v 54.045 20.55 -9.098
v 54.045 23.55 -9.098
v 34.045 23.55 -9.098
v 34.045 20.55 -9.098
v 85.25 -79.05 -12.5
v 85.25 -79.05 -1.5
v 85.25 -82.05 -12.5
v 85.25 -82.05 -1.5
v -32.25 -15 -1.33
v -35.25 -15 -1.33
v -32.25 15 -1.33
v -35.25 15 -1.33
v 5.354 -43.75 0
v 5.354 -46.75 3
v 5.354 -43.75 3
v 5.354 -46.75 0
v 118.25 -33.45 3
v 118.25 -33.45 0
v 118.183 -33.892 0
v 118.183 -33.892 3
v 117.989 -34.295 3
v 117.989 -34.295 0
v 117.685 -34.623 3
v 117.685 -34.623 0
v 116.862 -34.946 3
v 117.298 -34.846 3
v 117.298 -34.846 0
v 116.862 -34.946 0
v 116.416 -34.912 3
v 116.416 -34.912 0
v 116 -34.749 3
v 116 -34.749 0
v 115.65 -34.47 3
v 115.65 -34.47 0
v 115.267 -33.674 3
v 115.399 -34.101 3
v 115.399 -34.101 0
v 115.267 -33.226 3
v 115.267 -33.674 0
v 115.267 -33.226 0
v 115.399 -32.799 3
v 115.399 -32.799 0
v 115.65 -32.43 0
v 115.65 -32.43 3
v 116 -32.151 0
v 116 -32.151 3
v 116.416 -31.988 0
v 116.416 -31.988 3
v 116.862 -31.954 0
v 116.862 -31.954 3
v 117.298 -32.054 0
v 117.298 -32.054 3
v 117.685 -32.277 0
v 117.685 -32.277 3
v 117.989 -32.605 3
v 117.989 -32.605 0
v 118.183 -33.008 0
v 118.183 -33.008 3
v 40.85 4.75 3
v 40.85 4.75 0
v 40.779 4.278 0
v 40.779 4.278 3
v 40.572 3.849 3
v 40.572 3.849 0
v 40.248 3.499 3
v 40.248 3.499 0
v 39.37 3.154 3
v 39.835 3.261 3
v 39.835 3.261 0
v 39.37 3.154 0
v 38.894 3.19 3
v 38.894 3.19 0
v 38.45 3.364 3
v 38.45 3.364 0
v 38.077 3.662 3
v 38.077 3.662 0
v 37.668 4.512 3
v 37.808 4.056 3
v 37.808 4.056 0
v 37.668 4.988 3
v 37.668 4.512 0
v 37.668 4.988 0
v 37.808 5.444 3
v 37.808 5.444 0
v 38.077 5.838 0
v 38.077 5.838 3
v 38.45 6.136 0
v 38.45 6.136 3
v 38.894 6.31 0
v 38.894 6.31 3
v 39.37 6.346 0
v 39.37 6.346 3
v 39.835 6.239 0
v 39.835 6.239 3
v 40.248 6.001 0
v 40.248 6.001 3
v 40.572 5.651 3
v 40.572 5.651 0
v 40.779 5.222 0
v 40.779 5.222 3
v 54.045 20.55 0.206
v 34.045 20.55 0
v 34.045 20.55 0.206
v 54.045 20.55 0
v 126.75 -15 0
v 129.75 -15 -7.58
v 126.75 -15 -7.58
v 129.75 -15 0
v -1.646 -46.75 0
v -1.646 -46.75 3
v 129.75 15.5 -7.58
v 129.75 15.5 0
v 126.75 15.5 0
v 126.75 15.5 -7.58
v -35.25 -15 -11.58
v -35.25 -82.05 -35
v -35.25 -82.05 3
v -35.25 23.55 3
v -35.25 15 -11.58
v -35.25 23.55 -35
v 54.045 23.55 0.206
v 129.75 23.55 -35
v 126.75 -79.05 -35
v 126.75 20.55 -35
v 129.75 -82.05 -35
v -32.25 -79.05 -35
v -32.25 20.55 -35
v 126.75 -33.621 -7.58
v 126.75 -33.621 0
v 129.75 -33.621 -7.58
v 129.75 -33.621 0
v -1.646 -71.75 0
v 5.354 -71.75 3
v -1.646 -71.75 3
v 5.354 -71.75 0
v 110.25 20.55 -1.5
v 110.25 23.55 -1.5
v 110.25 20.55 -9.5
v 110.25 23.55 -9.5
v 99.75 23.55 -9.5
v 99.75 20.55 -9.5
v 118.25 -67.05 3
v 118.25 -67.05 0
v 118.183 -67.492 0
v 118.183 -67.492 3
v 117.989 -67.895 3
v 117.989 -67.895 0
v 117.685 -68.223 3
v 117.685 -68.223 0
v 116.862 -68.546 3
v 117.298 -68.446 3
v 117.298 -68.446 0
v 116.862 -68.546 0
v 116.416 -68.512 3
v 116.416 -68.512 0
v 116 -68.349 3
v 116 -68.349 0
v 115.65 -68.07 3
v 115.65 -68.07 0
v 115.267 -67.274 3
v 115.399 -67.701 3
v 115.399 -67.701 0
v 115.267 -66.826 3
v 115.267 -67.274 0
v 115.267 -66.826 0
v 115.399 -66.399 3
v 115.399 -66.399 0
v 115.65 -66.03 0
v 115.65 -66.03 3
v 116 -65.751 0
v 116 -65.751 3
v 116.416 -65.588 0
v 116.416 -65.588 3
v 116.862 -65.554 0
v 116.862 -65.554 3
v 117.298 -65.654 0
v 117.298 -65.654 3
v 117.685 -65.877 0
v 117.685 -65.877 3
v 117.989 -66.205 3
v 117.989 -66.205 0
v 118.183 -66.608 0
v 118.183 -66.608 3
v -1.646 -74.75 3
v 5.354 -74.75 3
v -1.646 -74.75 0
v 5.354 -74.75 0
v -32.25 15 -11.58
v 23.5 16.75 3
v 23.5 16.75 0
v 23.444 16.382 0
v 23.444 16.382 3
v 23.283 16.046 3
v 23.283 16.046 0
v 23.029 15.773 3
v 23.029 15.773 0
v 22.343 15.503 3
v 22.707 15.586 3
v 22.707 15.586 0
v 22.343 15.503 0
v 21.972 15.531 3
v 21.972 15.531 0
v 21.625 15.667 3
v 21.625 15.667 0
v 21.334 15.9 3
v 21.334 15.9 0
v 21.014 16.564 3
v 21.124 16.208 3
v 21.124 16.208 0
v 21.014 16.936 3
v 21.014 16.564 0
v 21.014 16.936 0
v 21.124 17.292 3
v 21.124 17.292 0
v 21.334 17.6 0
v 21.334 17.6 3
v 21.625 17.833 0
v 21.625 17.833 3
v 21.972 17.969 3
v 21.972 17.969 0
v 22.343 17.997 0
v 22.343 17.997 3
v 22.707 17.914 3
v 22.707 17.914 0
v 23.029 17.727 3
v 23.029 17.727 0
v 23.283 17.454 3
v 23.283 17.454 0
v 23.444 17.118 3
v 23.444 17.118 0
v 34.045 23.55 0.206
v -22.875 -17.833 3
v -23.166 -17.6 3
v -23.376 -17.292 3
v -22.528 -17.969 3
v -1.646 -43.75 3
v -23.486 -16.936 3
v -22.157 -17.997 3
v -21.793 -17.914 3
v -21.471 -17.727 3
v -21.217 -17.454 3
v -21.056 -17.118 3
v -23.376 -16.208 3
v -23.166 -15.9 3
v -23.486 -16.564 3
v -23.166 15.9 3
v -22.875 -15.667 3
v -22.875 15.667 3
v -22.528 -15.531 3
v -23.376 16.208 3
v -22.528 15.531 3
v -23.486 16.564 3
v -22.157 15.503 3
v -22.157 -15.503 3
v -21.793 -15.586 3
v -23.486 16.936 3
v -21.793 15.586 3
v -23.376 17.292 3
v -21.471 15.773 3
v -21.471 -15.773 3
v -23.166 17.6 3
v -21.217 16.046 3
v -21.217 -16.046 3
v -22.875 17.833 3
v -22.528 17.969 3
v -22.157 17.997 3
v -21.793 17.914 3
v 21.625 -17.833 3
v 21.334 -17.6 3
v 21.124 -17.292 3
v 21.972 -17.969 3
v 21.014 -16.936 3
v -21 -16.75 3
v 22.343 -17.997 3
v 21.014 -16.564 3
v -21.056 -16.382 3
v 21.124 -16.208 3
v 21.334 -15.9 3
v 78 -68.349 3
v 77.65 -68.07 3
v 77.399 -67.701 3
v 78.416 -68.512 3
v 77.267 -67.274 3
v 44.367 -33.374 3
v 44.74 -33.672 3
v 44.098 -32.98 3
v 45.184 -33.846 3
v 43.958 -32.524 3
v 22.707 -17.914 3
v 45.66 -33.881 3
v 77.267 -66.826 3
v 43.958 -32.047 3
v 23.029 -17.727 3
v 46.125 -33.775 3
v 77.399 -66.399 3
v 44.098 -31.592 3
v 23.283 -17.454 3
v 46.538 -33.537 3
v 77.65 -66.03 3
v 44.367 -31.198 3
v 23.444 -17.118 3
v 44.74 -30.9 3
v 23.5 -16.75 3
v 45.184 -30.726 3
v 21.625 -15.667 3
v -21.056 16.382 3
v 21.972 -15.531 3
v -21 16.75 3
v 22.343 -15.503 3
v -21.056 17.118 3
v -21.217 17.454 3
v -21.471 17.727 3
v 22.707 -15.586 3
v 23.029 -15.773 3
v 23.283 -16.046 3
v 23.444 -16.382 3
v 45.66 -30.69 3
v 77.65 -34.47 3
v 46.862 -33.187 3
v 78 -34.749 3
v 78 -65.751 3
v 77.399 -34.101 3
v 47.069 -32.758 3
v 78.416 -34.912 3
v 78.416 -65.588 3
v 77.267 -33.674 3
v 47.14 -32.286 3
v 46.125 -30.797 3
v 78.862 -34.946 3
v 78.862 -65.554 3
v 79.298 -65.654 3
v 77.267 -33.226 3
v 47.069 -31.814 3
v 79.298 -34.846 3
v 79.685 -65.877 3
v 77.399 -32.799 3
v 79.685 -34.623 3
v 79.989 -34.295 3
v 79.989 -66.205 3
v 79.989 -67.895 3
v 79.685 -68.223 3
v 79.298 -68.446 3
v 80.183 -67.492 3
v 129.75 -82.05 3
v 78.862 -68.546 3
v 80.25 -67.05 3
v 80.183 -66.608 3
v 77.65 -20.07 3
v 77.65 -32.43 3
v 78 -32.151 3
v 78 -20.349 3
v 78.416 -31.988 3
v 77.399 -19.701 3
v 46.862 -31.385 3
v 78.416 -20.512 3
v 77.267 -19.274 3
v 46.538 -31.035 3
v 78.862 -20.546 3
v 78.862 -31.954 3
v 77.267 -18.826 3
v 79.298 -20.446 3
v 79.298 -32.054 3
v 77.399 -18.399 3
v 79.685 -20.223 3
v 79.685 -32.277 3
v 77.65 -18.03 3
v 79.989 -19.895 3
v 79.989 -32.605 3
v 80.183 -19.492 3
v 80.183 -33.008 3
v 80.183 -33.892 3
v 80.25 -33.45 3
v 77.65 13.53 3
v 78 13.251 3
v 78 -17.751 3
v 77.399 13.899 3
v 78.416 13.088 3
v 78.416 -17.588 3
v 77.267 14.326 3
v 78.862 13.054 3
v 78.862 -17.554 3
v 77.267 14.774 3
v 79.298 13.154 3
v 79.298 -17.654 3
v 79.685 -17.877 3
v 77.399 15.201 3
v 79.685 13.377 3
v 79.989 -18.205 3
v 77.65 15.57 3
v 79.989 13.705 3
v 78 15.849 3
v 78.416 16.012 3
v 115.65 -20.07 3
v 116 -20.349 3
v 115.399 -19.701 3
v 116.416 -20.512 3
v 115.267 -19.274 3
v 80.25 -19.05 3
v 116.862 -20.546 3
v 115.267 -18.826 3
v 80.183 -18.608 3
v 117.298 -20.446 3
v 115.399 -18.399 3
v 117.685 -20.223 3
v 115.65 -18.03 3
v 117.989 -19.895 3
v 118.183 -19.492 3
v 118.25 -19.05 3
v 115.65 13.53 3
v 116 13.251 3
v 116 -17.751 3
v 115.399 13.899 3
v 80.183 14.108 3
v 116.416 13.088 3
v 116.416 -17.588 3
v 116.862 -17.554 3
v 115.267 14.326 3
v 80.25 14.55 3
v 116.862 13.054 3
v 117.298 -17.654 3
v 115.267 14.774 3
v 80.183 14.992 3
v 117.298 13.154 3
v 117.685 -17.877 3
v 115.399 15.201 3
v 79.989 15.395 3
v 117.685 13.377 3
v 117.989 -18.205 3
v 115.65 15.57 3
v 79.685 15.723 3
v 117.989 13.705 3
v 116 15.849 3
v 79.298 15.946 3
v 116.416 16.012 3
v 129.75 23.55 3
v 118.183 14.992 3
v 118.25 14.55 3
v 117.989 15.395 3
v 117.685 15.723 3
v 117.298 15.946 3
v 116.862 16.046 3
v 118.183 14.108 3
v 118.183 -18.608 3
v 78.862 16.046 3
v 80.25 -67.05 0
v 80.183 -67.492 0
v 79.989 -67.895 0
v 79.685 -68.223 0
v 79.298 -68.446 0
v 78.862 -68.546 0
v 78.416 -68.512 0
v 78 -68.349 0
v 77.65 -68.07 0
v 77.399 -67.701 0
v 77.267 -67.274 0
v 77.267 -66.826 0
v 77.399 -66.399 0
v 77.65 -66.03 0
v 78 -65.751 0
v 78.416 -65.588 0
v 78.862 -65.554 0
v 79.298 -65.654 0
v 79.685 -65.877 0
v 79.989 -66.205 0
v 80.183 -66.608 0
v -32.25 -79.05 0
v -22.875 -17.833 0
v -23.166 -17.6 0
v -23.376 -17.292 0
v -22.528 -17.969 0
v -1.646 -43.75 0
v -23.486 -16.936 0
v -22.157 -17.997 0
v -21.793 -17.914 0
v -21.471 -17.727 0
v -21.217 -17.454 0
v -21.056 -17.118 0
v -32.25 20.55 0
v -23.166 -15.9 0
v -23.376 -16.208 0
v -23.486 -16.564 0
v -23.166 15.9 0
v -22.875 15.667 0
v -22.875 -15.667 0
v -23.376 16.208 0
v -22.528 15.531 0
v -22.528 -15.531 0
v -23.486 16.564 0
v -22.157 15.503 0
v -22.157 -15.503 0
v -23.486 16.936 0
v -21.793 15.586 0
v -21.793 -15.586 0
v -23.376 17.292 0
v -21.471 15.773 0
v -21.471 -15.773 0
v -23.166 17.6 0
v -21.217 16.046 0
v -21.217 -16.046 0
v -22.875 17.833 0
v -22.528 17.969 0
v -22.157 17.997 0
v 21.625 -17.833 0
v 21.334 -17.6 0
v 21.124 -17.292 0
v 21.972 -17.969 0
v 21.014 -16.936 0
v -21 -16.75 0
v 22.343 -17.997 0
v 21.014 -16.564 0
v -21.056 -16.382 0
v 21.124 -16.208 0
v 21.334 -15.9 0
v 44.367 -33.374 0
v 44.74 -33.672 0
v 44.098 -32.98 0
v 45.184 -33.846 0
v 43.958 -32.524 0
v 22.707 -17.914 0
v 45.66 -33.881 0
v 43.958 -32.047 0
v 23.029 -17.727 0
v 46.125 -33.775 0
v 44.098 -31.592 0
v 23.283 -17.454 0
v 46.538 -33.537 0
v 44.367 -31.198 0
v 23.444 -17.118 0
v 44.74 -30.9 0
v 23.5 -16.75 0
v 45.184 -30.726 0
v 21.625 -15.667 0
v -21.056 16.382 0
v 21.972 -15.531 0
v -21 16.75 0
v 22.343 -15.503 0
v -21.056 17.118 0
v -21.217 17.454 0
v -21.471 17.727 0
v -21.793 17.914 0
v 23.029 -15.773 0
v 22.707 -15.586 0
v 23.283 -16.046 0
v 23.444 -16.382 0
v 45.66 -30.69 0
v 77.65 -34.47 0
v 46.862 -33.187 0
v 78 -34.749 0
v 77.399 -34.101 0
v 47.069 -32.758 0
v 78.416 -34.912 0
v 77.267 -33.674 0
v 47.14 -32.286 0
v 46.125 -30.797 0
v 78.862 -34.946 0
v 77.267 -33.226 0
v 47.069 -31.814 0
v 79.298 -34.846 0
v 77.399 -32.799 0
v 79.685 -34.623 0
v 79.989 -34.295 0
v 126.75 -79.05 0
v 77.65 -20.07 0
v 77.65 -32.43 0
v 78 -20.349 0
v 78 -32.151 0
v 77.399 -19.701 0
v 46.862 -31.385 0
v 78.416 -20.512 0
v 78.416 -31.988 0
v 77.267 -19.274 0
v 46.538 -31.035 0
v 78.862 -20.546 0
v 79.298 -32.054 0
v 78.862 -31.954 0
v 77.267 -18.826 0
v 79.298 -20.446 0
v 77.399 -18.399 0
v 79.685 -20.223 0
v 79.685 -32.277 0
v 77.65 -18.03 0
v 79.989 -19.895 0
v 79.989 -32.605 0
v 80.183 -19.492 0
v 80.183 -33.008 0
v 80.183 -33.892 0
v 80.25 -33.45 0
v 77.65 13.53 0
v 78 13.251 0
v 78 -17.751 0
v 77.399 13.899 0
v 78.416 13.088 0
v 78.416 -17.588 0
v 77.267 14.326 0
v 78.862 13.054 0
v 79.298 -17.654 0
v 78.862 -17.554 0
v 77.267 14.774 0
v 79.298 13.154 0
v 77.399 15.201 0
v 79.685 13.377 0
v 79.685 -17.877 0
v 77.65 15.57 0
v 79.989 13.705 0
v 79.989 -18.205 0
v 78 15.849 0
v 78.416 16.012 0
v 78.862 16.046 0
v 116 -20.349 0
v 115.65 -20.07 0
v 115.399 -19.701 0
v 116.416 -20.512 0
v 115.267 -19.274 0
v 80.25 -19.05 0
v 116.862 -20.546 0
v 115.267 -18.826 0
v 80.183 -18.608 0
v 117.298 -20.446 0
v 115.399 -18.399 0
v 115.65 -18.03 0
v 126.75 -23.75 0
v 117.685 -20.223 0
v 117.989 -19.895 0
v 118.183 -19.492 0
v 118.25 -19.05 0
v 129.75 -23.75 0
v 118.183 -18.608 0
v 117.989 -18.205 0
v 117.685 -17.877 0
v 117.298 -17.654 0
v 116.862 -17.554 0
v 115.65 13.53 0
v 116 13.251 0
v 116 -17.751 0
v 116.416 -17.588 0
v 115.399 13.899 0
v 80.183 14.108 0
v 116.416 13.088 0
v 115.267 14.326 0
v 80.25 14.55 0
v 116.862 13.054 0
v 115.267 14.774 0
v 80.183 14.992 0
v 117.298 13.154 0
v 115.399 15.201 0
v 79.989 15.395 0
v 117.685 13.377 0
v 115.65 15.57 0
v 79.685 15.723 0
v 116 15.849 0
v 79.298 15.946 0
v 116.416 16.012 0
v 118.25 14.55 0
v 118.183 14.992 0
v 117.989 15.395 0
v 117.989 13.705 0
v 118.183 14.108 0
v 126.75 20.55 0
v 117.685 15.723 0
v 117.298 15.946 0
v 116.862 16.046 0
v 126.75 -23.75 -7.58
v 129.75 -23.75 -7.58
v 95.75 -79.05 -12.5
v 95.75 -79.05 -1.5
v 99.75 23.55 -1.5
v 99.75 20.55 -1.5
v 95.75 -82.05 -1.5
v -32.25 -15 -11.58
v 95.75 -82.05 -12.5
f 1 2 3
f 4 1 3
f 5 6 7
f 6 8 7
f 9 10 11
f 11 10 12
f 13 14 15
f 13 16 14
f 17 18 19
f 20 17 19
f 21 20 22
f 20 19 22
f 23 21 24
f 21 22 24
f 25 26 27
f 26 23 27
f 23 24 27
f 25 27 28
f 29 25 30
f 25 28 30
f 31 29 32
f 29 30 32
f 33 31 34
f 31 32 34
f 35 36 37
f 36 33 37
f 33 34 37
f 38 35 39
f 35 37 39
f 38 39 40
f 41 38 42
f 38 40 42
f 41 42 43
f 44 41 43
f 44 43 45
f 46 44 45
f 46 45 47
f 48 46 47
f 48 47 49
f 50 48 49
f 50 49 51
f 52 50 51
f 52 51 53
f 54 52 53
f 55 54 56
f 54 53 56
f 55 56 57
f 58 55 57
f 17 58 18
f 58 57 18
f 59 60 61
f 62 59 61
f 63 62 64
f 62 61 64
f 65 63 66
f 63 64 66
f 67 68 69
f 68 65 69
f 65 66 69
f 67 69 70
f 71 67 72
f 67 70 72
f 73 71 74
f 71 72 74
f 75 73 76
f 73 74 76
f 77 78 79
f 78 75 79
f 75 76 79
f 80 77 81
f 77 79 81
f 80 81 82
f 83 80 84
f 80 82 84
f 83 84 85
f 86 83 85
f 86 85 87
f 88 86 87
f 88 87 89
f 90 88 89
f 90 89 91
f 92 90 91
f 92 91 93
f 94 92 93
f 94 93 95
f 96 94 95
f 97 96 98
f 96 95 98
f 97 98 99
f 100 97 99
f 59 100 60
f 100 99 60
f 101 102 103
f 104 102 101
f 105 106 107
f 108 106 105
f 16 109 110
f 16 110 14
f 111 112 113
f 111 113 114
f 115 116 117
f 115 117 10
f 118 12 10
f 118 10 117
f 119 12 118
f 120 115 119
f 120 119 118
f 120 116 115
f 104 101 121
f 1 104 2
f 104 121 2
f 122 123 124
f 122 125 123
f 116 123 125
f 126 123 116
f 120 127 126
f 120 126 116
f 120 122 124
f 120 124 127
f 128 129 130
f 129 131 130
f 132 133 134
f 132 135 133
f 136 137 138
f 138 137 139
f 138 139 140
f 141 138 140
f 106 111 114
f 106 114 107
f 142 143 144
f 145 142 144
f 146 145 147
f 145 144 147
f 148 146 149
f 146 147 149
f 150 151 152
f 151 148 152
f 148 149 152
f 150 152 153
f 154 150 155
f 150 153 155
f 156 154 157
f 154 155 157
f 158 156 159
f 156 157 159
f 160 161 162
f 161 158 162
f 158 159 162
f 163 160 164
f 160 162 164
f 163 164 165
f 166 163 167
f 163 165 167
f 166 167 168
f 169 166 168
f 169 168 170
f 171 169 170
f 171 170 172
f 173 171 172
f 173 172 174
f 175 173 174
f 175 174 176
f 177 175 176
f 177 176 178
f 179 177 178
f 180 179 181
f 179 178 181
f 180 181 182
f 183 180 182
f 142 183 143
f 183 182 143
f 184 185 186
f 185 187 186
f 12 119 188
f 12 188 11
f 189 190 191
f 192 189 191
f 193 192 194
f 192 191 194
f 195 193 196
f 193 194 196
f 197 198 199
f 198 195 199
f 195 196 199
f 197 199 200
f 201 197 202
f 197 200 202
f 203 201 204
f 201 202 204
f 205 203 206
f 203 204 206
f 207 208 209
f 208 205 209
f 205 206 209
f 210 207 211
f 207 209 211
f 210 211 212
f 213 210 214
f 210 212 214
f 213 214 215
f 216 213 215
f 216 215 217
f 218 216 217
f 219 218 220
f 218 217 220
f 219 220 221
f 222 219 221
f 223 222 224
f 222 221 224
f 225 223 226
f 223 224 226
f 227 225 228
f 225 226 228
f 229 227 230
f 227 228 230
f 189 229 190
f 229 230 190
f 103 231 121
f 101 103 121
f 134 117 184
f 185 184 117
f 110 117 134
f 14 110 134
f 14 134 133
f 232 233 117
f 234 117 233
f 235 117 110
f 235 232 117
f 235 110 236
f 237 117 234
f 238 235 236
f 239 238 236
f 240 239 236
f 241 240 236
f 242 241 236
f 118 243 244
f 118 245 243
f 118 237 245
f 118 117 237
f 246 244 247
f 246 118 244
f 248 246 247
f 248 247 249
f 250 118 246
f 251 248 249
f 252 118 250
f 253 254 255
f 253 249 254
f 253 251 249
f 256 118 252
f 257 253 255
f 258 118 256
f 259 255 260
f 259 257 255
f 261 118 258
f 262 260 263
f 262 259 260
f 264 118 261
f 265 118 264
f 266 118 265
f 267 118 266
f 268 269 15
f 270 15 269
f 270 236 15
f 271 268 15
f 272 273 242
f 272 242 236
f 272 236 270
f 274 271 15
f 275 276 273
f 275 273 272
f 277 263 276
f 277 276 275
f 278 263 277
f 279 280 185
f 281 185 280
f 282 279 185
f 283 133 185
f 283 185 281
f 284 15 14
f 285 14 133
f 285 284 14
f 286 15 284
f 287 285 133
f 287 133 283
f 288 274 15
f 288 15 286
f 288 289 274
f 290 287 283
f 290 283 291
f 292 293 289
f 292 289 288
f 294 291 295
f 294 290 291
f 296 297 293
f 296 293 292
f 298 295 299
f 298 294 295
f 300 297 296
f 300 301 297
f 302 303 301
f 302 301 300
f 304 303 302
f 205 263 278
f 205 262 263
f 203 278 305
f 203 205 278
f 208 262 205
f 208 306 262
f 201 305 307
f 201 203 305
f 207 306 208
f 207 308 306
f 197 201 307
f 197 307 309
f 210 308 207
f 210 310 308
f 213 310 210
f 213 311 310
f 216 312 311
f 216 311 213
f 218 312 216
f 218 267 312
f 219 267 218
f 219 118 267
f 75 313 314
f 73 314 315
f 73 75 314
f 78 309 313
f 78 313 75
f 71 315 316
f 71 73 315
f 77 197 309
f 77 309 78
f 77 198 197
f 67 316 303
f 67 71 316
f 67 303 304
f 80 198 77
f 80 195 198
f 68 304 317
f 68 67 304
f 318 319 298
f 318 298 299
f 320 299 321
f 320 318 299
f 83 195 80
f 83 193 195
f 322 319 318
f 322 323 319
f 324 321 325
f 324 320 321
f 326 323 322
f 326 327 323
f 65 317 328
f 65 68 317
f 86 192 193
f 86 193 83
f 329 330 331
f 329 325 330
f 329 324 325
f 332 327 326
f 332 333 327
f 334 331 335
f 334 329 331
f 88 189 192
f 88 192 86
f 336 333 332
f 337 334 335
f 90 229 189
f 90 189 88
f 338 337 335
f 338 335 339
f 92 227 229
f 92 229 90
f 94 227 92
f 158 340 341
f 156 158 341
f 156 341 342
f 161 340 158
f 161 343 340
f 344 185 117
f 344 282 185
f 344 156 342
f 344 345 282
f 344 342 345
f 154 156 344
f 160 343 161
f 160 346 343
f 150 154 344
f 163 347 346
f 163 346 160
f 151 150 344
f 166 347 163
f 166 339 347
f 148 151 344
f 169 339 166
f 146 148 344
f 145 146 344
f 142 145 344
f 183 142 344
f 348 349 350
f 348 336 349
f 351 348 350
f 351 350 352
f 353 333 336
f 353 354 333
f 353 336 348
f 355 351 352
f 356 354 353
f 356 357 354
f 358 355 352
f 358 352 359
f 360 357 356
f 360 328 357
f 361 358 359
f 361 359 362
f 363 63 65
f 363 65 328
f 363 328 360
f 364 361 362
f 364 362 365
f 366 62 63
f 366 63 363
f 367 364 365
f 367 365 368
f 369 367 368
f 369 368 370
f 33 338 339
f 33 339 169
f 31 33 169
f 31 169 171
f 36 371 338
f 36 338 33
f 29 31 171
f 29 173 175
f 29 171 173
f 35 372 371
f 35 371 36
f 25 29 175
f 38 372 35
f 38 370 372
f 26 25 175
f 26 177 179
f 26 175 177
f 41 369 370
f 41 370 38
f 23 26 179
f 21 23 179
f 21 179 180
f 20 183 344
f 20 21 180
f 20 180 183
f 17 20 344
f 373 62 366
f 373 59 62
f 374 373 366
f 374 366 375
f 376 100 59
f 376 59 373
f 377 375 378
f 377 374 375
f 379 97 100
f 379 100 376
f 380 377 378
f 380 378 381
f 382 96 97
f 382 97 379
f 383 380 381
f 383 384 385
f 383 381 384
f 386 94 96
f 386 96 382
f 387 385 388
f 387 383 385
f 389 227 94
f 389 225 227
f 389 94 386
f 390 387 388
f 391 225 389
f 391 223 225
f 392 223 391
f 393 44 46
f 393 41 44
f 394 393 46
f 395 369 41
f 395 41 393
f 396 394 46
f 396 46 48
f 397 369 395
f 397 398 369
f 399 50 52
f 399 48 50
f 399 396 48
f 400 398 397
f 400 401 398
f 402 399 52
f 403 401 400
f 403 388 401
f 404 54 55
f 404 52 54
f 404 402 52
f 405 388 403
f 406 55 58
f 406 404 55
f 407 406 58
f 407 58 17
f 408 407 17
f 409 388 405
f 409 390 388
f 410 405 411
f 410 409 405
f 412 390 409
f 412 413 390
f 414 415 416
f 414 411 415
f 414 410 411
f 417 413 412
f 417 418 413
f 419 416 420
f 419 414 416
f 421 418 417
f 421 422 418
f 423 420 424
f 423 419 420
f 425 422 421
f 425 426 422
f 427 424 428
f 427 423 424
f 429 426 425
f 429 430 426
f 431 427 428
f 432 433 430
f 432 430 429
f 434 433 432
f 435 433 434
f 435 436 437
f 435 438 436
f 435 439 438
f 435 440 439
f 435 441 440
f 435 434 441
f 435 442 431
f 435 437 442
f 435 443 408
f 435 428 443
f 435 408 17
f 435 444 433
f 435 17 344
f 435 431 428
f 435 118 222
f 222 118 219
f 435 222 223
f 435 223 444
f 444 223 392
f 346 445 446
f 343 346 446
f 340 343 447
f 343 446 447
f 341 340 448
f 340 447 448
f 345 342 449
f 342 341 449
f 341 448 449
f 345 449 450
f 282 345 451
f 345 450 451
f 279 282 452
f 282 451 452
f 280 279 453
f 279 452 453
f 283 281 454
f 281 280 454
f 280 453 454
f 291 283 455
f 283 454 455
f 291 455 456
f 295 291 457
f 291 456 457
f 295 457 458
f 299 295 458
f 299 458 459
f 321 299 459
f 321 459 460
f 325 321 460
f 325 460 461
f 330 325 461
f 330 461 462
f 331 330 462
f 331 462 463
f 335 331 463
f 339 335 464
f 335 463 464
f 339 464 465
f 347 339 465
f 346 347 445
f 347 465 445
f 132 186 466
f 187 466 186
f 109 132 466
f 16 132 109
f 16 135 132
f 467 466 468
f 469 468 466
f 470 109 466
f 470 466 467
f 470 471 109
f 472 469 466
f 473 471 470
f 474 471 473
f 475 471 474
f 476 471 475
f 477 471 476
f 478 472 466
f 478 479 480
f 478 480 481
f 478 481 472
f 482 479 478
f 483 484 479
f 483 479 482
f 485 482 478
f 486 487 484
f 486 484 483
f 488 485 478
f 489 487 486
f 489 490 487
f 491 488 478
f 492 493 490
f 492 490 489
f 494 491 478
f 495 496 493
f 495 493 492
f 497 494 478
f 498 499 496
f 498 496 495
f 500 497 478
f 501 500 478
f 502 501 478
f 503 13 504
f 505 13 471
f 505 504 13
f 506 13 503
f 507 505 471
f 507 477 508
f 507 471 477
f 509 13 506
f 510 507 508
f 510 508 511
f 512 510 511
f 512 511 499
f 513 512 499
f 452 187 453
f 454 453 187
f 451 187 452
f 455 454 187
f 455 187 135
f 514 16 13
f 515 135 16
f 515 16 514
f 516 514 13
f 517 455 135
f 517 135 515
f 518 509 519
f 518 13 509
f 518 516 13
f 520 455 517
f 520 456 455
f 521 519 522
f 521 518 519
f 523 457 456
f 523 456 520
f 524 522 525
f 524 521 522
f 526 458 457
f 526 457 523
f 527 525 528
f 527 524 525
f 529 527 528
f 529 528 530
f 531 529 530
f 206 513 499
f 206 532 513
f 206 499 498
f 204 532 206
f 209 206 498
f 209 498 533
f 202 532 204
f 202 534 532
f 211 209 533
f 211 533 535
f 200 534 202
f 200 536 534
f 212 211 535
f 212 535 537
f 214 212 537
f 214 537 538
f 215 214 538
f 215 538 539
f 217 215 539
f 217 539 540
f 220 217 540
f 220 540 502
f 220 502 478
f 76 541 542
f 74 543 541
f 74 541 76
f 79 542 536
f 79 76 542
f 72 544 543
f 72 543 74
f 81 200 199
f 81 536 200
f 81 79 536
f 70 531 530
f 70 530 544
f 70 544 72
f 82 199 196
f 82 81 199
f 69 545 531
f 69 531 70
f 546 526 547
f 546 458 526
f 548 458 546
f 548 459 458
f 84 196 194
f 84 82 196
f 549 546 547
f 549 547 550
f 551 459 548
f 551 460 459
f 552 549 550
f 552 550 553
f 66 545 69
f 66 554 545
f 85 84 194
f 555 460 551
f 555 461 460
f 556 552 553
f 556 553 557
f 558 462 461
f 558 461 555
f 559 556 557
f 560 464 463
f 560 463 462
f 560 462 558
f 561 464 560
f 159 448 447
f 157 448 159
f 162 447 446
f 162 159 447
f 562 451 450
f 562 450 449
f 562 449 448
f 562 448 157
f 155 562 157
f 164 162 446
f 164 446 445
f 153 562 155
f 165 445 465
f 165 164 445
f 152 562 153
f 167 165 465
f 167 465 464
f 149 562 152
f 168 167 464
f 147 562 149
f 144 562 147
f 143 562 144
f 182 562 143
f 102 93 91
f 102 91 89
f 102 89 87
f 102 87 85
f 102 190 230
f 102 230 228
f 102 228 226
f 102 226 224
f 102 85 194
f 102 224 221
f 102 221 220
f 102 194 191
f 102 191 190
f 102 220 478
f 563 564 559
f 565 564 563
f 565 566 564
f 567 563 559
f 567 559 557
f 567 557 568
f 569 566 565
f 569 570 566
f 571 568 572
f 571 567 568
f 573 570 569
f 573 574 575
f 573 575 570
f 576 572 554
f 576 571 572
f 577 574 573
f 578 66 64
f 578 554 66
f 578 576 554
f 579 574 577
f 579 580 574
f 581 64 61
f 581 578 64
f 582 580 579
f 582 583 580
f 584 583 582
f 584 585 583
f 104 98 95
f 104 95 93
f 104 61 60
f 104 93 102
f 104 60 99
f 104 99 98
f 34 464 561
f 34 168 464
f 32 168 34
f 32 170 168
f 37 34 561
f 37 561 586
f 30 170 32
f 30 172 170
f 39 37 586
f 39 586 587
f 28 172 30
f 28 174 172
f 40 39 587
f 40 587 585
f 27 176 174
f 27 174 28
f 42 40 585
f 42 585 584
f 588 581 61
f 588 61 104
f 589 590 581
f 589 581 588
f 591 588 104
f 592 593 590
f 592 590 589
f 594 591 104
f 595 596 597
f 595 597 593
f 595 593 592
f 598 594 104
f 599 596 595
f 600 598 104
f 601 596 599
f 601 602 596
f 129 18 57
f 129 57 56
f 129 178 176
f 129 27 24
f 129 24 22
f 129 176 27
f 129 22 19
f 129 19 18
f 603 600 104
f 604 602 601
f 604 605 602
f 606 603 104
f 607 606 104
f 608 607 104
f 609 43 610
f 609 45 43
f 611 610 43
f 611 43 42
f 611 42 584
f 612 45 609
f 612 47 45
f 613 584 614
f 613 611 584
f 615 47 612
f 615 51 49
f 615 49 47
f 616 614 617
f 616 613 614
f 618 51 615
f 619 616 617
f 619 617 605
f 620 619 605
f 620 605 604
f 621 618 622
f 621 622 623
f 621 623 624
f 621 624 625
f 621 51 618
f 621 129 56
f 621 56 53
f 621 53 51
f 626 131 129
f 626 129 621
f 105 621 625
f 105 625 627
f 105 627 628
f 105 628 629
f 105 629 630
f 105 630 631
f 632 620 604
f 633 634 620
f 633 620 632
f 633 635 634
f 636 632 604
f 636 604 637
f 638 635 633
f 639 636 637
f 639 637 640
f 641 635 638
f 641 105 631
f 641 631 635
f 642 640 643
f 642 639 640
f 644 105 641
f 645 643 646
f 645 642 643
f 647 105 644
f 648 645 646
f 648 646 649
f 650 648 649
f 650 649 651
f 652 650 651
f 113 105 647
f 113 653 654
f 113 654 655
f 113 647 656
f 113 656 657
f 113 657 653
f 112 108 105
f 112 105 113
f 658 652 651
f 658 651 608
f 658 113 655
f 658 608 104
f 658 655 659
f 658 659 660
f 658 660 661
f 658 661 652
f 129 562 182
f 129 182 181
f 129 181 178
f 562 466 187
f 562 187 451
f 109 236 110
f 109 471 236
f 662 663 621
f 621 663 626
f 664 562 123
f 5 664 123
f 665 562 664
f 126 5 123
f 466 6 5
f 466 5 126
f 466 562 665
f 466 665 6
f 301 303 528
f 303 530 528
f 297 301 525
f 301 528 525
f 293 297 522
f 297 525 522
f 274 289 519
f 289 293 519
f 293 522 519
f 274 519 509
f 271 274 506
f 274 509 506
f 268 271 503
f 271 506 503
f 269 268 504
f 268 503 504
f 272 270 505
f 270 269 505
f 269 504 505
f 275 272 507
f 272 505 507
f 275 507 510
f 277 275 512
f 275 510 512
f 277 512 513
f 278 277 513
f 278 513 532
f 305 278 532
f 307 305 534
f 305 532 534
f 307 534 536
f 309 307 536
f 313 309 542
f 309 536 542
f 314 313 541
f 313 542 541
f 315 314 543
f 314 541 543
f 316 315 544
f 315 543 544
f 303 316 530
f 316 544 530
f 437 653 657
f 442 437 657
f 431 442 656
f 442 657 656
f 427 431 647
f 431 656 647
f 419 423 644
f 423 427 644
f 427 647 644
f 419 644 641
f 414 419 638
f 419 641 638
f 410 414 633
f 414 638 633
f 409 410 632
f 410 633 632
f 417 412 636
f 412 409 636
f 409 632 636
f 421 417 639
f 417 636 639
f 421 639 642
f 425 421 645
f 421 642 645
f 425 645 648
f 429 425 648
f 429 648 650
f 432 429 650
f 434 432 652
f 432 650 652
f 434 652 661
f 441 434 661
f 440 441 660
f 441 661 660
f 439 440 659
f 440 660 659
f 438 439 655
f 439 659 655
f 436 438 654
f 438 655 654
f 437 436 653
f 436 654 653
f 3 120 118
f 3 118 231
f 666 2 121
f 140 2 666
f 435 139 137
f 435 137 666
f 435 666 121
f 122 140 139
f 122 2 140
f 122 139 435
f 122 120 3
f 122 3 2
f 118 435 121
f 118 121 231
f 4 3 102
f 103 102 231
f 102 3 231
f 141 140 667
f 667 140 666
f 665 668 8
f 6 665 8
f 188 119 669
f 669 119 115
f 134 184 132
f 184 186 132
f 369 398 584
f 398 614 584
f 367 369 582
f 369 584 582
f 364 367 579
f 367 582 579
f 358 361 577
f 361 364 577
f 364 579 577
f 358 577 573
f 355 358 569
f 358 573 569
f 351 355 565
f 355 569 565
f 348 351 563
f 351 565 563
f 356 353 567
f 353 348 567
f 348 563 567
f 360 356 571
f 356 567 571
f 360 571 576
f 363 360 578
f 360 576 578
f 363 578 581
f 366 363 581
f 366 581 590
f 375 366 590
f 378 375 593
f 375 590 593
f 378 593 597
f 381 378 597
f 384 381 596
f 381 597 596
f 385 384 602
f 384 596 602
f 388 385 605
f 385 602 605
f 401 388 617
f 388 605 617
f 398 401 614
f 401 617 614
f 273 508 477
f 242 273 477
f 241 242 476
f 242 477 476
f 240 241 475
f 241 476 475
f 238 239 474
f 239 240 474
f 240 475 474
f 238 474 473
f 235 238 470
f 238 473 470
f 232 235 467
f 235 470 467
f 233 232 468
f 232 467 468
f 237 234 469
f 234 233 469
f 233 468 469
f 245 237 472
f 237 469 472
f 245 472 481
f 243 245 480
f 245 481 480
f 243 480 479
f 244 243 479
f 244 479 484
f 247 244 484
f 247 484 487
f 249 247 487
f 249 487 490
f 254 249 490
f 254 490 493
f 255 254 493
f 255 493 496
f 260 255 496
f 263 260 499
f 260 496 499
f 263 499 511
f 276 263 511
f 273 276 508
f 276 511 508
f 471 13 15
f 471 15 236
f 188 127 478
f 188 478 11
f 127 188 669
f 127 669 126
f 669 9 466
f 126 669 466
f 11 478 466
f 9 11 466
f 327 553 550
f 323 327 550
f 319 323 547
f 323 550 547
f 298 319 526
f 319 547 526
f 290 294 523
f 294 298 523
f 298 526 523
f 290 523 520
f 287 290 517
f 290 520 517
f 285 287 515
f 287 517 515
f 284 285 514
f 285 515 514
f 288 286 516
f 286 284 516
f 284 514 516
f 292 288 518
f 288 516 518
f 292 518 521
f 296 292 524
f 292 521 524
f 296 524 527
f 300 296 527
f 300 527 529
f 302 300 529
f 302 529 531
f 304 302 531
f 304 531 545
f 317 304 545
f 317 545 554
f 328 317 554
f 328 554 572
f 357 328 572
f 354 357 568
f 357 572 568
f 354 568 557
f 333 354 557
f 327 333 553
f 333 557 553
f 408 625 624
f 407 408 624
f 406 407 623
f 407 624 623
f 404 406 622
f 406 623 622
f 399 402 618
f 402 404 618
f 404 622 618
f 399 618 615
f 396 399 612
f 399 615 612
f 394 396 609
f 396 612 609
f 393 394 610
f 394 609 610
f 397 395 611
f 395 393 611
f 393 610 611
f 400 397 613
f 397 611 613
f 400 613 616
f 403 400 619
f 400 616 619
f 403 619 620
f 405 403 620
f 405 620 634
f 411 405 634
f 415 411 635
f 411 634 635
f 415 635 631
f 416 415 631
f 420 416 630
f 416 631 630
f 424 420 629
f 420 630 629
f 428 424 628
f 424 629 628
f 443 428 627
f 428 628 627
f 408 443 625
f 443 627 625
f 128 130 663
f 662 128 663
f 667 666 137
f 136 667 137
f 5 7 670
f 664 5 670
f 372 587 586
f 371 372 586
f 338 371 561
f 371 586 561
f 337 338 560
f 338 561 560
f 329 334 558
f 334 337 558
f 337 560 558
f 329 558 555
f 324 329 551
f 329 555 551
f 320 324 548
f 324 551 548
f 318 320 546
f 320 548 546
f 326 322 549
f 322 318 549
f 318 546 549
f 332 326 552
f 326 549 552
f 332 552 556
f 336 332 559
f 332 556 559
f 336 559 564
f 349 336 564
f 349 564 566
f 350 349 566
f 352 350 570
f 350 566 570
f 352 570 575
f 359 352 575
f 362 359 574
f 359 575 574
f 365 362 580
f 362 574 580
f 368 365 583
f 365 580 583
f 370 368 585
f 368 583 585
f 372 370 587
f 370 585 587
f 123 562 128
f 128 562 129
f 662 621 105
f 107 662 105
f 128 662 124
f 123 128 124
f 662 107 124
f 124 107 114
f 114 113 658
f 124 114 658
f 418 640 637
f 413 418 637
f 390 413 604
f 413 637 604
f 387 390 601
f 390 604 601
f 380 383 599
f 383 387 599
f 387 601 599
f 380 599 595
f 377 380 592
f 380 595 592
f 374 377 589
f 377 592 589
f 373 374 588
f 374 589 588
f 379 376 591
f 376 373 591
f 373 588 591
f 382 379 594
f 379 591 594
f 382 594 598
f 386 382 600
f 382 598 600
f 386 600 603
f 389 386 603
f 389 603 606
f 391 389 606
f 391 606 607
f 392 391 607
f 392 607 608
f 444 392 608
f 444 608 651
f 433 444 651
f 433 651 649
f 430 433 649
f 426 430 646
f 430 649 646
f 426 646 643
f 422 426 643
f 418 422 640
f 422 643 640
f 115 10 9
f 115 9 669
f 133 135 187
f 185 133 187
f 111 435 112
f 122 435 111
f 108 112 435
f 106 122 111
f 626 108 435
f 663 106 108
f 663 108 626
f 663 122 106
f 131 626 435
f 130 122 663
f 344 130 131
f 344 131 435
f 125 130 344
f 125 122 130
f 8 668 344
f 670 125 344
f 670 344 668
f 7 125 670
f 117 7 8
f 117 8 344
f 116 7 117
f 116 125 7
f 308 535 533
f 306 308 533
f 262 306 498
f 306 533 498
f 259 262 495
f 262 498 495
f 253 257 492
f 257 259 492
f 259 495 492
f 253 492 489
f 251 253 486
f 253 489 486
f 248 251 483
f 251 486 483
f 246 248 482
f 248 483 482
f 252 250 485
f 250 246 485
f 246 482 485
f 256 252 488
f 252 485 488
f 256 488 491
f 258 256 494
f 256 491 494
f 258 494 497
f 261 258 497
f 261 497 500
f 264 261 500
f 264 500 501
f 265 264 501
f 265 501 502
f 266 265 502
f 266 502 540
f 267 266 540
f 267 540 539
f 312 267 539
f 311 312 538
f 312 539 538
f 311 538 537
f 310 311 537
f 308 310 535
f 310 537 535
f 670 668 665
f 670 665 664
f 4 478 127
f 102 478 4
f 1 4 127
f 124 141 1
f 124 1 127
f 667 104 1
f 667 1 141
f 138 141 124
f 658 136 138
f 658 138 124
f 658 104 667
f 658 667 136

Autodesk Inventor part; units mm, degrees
ref_plane "YZ Plane" through (0, 0, 0) normal (1, 0, 0) x (0, 1, 0)
ref_plane "XZ Plane" through (0, 0, 0) normal (0, 1, 0) x (-1, 0, 0)
ref_plane "XY Plane" through (0, 0, 0) normal (0, 0, 1) x (1, 0, 0)
sketch "Эскиз1" plane through (0, 0, 0) normal (0, 0, 1) x (1, 0, 0)
  circle A0 centre (-22.25, 16.75) radius 1.25 projected
  circle A1 centre (22.25, 16.75) radius 1.25 projected
  circle A2 centre (22.25, -16.75) radius 1.25 projected
  circle A3 centre (-22.25, -16.75) radius 1.25 projected
  circle A4 centre (39.25, 4.75) radius 1.6 projected
  circle A5 centre (45.54, -32.2859) radius 1.6 projected
  circle A6 centre (78.75, -19.05) radius 1.5 projected
  circle A7 centre (78.75, 14.55) radius 1.5 projected
  circle A8 centre (116.75, 14.55) radius 1.5 projected
  circle A9 centre (116.75, -19.05) radius 1.5 projected
  circle A10 centre (116.75, -33.45) radius 1.5 projected
  circle A11 centre (78.75, -33.45) radius 1.5 projected
  circle A12 centre (78.75, -67.05) radius 1.5 projected
  circle A13 centre (116.75, -67.05) radius 1.5 projected
  line L0 (-19.75, -46.75) -> (24.25, -46.75) projected
  line L1 (24.25, -71.75) -> (-19.75, -71.75) projected
  line L2 (-1.6455, -46.75) -> (5.3545, -46.75)
  line L3 (5.3545, -46.75) -> (5.3545, -43.75)
  line L4 (5.3545, -43.75) -> (-1.6455, -43.75)
  line L5 (-1.6455, -43.75) -> (-1.6455, -46.75)
  line L6 (-1.6455, -71.75) -> (5.3545, -71.75)
  line L7 (5.3545, -71.75) -> (5.3545, -74.75)
  line L8 (5.3545, -74.75) -> (-1.6455, -74.75)
  line L9 (-1.6455, -74.75) -> (-1.6455, -71.75)
  line L10 (-32.25, 20.55) -> (126.75, 20.55)
  line L11 (126.75, 20.55) -> (126.75, -79.05)
  line L12 (126.75, -79.05) -> (-32.25, -79.05)
  line L13 (-32.25, -79.05) -> (-32.25, 20.55)
  point P0 (0, 0)
  dimension "d0" = 7
  dimension "d1" = 3
  dimension "d2" = 3
  dimension "d3" = 6
  dimension "d4" = 10
  dimension "d5" = 12
  dimension "d6" = 10
extrude "Выдавливание1" add sketch "Эскиз1" along normal blind 3
sketch "Эскиз2" plane through (0, 0, 0) normal (0, 0, -1) x (-1, 0, 0)
  line L0 (32.25, 20.55) -> (32.25, -79.05) projected
  line L1 (-126.75, -79.05) -> (-126.75, 20.55) projected
  line L2 (32.25, 20.55) -> (-126.75, 20.55)
  line L3 (-126.75, 20.55) -> (-126.75, -79.05)
  line L4 (-126.75, -79.05) -> (32.25, -79.05)
  line L5 (32.25, -79.05) -> (32.25, 20.55)
  line L6 (35.25, 23.55) -> (-129.75, 23.55)
  line L7 (-129.75, 23.55) -> (-129.75, -82.05)
  line L8 (-129.75, -82.05) -> (35.25, -82.05)
  line L9 (35.25, -82.05) -> (35.25, 23.55)
  point P0 (0, 0)
  point P1 (-126.75, 20.55)
  dimension "d9" = 3
  dimension "d10" = 3
  dimension "d11" = 3
  dimension "d12" = 3
extrude "Выдавливание2" add sketch "Эскиз2" along normal blind 35
sketch "Эскиз3" plane through (0, 0, 0) normal (0, 0, 1) x (1, 0, 0)
  line L0 (129.75, 23.55) -> (129.75, -82.05) projected
  line L1 (-35.25, 23.55) -> (129.75, 23.55) projected
  line L2 (-35.25, -82.05) -> (-35.25, 23.55) projected
  line L3 (129.75, -82.05) -> (-35.25, -82.05) projected
  line L4 (126.75, 20.55) -> (-32.25, 20.55) projected
  line L5 (126.75, -79.05) -> (126.75, 20.55) projected
  line L6 (-32.25, -79.05) -> (126.75, -79.05) projected
  line L7 (-32.25, 20.55) -> (-32.25, -79.05) projected
  point P0 (0, 0)
extrude "Выдавливание3" add sketch "Эскиз3" along normal blind 3
sketch "Эскиз4" plane through (-35.25, 23.55, -35) normal (0, 1, 0) x (1, 0, 0)
  line L0 (82.1894, -30.7775) -> (76.4292, -30.7775) projected
  line L1 (82.1894, -30.7775) -> (76.4292, -30.7775) projected
  line L2 (82.1894, -30.7775) -> (82.3893, -30.7775) projected
  line L3 (3, -35) -> (162, -35) projected
  line L4 (74.4292, -29.1972) -> (84.4292, -29.1972)
  line L5 (84.4292, -29.1972) -> (84.4292, -35)
  line L6 (84.4292, -35) -> (74.4292, -35)
  line L7 (74.4292, -35) -> (74.4292, -29.1972)
  point P0 (35.25, -35)
  dimension "d17" = 10
  dimension "d18" = 2
extrude "Выдавливание4" cut sketch "Эскиз4" against normal blind 3
sketch "Эскиз5" plane through (-35.25, 23.55, -35) normal (0, 1, 0) x (1, 0, 0)
  line L0 (74.4292, -35) -> (74.4292, -29.1972) projected
  line L1 (84.4292, -29.1972) -> (84.4292, -35) projected
  line L2 (74.4292, -29.1972) -> (84.4292, -29.1972) projected
  line L3 (84.4292, -35) -> (74.4292, -35) projected
  line L4 (69.2946, -35.2061) -> (89.2946, -35.2061)
  line L5 (89.2946, -35.2061) -> (89.2946, -25.902)
  line L6 (89.2946, -25.902) -> (69.2946, -25.902)
  line L7 (69.2946, -25.902) -> (69.2946, -35.2061)
  point P0 (35.25, -35)
  dimension "d21" = 20
extrude "Выдавливание5" cut sketch "Эскиз5" against normal blind 3
sketch "Эскиз6" plane through (-35.25, 23.55, -35) normal (0, 1, 0) x (1, 0, 0)
  line L0 (135, -33.5) -> (145.5, -33.5) projected
  line L1 (135, -33.5) -> (145.5, -33.5) projected
  line L2 (145.5, -25.5) -> (135, -25.5) projected
  line L3 (135, -33.5) -> (145.5, -33.5)
  line L4 (145.5, -33.5) -> (145.5, -25.5)
  line L5 (145.5, -25.5) -> (135, -25.5)
  line L6 (135, -25.5) -> (135, -33.5)
  point P0 (35.25, -35)
extrude "Выдавливание6" cut sketch "Эскиз6" against normal blind 3
sketch "Эскиз7" plane through (129.75, -82.05, -35) normal (1, 0, 0) x (0, 0, -1)
  line L0 (-27.42, 97.05) -> (-27.42, 67.05) projected
  line L1 (-35, 3) -> (-35, 102.6) projected
  line L2 (-35, 97.55) -> (-35, 100.05) projected
  line L3 (-27.42, 67.05) -> (-35, 67.05)
  line L4 (-35, 67.05) -> (-35, 97.55)
  line L5 (-35, 97.55) -> (-27.42, 97.55)
  line L6 (-27.42, 97.55) -> (-27.42, 67.05)
  line L7 (-33.5, 58.3) -> (-22.5, 58.3) projected
  line L8 (-35, 102.6) -> (-35, 3) projected
  line L9 (-27.42, 58.3) -> (-35, 58.3)
  line L10 (-35, 58.3) -> (-35, 48.4289)
  line L11 (-35, 48.4289) -> (-27.42, 48.4289)
  line L12 (-27.42, 48.4289) -> (-27.42, 58.3)
  point P0 (-35, 82.05)
  point P1 (-33.5, 58.3)
  point P2 (-35, 58.3)
  point P3 (-35, 48.4289)
  point P4 (-27.42, 97.05)
  point P5 (-35, 67.05)
extrude "Выдавливание7" cut sketch "Эскиз7" against normal blind 3
sketch "Эскиз8" plane through (-35.25, -82.05, -35) normal (0, -1, 0) x (1, 0, 0)
  line L0 (131, 33.5) -> (131, 22.5) projected
  line L1 (120.5, 33.5) -> (120.5, 22.5) projected
  line L2 (120.5, 22.5) -> (131, 22.5)
  line L3 (131, 22.5) -> (131, 33.5)
  line L4 (131, 33.5) -> (120.5, 33.5)
  line L5 (120.5, 33.5) -> (120.5, 22.5)
  point P0 (35.25, 35)
extrude "Выдавливание8" cut sketch "Эскиз8" against normal blind 3
sketch "Эскиз9" plane through (-35.25, -82.05, -35) normal (-1, 0, 0) x (0, 0, 1)
  line L0 (23.42, 97.05) -> (23.42, 67.05) projected
  line L1 (33.67, 64.8) -> (33.67, 99.3) projected
  line L2 (35, 67.05) -> (27.42, 67.05) projected
  line L3 (23.42, 97.05) -> (33.67, 97.05)
  line L4 (33.67, 97.05) -> (33.67, 67.05)
  line L5 (33.67, 67.05) -> (23.42, 67.05)
  line L6 (23.42, 67.05) -> (23.42, 97.05)
  point P0 (35, 82.05)
  point P1 (23.42, 67.05)
  point P2 (27.42, 67.05)
extrude "Выдавливание9" cut sketch "Эскиз9" against normal blind 3
properties part number "корпус"
